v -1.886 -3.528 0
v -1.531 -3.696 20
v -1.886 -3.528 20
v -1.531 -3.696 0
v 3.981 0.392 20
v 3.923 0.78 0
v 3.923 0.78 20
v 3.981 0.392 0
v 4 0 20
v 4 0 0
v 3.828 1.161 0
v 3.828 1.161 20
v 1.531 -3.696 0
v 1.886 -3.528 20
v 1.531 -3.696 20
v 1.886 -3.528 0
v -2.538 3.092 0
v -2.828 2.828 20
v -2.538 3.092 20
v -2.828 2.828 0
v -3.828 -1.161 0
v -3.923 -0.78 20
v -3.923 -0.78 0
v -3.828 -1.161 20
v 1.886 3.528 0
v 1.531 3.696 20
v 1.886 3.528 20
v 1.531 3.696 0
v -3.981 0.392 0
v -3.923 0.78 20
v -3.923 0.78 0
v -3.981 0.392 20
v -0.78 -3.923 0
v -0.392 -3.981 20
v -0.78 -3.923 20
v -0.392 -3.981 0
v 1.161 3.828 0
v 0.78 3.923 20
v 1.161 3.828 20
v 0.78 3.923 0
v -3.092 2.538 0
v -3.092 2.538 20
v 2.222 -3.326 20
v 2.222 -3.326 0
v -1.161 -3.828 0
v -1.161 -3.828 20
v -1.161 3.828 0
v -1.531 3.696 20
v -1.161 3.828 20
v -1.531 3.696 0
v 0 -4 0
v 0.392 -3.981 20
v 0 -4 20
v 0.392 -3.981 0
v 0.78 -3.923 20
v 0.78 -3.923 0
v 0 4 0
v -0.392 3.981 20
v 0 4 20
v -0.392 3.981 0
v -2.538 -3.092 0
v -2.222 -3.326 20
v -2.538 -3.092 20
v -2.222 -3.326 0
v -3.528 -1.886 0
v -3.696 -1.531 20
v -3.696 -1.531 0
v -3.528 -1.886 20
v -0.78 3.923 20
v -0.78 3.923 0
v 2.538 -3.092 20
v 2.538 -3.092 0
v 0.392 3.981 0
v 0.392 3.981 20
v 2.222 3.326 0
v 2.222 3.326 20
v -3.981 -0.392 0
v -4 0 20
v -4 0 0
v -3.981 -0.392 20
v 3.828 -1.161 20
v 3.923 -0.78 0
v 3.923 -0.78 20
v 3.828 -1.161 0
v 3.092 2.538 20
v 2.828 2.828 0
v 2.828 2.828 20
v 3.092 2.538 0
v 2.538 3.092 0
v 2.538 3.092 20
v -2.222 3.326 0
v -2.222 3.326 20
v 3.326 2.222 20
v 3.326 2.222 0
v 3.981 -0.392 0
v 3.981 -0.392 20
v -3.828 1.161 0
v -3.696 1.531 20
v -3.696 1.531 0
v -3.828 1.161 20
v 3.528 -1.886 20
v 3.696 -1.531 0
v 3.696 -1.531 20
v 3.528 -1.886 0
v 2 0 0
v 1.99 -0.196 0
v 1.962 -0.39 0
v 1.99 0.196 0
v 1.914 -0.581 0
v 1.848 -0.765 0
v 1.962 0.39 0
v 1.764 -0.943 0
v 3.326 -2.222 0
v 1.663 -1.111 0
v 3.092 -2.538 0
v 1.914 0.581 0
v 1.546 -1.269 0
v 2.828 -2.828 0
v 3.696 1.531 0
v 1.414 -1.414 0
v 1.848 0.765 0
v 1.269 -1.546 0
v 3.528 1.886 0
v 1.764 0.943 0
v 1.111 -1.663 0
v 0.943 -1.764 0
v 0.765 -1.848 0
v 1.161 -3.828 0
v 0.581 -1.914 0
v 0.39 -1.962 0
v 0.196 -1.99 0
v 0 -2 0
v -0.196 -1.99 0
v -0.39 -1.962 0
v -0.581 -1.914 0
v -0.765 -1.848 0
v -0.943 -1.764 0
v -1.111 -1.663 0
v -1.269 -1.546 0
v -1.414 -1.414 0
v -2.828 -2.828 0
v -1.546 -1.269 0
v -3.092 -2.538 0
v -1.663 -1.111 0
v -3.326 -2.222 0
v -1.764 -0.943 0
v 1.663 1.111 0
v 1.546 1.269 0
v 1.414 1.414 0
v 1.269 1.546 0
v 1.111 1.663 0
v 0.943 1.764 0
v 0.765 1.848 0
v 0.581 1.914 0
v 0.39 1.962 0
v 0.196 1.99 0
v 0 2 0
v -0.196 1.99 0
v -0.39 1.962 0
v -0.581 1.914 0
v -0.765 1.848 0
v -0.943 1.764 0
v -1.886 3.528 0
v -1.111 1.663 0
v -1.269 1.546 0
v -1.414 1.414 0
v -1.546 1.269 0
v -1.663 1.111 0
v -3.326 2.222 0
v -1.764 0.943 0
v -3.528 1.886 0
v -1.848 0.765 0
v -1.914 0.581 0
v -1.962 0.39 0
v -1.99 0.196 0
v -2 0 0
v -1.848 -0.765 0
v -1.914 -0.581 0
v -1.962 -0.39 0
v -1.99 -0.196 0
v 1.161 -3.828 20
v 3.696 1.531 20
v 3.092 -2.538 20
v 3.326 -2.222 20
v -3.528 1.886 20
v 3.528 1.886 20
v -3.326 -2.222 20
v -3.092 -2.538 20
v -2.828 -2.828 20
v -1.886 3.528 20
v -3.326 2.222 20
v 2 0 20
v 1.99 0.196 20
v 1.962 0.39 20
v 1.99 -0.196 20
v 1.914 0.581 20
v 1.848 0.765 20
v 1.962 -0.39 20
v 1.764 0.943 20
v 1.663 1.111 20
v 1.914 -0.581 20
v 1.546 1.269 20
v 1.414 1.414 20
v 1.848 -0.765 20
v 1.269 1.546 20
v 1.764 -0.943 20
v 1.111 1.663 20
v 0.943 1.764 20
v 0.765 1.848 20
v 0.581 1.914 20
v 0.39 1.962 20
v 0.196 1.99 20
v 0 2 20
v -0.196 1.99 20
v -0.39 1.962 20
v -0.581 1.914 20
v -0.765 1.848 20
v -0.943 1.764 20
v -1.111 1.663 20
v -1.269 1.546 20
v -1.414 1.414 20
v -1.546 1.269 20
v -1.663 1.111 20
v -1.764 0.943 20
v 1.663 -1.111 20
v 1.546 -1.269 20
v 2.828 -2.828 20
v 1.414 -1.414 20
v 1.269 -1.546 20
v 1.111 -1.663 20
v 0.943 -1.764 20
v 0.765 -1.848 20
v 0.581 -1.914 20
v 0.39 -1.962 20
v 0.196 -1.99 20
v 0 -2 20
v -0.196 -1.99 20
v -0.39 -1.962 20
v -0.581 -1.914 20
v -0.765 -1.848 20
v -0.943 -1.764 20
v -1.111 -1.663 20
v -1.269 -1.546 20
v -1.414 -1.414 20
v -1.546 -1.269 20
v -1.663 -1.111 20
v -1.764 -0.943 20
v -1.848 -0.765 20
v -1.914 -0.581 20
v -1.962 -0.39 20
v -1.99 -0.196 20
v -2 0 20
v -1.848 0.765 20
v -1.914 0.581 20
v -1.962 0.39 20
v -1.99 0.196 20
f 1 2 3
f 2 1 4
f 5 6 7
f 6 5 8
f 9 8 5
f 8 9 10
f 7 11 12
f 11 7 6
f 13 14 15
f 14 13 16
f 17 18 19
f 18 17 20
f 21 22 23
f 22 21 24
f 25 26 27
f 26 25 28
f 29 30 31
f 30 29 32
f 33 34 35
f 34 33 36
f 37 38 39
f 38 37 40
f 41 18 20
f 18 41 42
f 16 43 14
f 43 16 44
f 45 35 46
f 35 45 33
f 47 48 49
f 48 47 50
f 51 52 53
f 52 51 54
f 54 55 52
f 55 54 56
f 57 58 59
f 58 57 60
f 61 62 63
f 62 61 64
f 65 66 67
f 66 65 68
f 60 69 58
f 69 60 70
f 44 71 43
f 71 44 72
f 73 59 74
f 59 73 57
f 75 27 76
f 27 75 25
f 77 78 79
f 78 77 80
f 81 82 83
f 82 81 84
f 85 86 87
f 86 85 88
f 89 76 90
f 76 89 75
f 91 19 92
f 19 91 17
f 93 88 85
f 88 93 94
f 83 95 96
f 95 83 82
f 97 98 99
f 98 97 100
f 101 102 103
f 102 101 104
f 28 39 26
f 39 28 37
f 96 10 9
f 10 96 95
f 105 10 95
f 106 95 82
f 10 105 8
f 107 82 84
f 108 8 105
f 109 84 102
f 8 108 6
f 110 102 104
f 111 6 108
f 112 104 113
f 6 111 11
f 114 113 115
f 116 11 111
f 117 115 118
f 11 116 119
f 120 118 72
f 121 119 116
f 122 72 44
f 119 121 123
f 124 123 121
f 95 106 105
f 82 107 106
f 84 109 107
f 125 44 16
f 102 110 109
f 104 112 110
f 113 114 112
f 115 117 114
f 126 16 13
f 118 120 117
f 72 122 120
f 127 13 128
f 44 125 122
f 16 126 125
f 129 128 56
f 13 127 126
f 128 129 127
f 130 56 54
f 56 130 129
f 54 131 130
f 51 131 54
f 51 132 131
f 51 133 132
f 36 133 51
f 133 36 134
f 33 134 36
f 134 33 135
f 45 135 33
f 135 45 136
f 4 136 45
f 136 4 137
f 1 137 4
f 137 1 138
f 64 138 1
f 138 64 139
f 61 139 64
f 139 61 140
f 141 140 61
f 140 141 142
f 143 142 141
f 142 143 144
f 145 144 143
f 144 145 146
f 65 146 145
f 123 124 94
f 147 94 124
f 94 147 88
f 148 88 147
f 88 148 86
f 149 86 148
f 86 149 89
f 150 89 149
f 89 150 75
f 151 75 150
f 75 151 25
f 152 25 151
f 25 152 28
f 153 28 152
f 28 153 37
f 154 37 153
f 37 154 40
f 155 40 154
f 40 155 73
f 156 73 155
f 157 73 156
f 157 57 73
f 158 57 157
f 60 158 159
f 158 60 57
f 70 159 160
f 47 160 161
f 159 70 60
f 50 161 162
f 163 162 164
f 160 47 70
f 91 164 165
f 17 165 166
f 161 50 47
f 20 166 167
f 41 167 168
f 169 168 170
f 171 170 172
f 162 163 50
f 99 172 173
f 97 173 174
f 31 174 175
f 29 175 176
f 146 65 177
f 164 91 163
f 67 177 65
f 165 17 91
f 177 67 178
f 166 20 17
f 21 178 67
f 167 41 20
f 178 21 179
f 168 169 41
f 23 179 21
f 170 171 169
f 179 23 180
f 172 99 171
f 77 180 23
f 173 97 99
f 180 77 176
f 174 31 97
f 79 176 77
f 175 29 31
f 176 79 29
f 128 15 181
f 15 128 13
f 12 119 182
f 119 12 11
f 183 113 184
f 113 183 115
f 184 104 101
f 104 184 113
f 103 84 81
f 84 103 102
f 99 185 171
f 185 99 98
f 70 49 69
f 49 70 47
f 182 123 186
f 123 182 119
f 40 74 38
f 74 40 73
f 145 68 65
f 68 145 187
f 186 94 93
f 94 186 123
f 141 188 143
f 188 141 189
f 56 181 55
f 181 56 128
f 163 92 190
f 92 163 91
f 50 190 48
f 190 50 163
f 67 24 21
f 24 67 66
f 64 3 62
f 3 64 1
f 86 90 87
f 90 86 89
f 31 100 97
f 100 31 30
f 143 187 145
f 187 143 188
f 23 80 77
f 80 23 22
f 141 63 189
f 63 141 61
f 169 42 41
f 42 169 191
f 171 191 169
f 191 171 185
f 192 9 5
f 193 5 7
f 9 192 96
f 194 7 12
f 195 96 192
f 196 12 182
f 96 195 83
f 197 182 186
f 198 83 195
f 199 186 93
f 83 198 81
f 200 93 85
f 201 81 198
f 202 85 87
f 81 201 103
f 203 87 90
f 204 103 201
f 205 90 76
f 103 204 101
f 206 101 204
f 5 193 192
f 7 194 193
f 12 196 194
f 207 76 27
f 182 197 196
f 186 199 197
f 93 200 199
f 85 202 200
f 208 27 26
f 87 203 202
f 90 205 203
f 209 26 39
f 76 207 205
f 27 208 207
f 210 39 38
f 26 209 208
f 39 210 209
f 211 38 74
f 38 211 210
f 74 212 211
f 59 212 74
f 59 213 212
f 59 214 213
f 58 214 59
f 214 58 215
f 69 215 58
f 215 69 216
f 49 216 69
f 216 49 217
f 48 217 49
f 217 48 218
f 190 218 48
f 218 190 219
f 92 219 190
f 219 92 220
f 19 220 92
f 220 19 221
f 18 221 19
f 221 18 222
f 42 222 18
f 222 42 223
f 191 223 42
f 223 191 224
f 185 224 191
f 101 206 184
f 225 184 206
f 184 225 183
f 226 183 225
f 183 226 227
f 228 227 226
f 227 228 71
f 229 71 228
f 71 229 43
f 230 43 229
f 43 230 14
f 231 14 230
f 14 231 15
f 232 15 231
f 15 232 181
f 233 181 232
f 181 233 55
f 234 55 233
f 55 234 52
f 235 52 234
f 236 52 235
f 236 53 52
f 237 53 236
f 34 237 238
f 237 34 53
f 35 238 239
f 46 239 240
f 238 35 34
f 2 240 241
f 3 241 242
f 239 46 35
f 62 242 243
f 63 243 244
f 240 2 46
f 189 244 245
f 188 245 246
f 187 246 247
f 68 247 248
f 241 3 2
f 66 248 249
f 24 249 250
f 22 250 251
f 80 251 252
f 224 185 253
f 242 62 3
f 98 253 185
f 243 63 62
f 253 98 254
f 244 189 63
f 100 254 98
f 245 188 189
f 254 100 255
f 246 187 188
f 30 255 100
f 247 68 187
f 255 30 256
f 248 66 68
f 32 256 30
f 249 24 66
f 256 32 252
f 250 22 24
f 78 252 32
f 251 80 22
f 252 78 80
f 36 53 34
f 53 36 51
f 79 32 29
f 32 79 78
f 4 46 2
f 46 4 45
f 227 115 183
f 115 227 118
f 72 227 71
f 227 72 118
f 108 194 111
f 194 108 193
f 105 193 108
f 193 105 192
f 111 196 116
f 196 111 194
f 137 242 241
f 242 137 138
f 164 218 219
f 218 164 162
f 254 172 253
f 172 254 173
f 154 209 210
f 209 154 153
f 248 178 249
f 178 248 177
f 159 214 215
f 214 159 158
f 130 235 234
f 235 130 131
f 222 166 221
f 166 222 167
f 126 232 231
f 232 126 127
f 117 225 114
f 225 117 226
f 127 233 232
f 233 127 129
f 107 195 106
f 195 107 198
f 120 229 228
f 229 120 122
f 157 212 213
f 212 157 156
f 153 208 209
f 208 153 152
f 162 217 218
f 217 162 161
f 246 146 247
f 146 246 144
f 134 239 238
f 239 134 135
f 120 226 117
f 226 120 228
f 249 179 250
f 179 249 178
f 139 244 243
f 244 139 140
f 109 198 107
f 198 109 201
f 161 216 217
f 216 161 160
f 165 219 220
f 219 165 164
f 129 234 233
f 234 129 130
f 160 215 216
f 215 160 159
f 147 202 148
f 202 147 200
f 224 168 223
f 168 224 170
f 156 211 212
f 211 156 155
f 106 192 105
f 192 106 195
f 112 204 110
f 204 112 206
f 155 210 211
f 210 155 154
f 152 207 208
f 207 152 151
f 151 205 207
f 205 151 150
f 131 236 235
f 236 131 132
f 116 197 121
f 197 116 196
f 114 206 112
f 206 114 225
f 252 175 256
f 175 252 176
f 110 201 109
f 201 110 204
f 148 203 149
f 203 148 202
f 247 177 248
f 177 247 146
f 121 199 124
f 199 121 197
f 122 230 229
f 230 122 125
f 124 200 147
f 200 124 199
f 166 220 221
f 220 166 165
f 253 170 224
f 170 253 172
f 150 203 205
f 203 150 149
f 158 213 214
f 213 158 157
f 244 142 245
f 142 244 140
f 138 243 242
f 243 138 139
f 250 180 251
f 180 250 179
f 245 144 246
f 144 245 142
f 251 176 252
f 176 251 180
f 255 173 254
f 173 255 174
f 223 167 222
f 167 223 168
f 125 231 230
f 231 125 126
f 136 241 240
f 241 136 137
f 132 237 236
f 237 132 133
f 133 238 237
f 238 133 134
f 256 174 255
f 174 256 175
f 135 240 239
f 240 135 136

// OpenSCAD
module standoff_pillar() {
    difference() {
        cylinder(h = 20.0, d = 8.0, $fn = 64);
        translate([0, 0, -1])
            cylinder(h = 22.0, d = 4.0, $fn = 64);
    }
}

standoff_pillar();
